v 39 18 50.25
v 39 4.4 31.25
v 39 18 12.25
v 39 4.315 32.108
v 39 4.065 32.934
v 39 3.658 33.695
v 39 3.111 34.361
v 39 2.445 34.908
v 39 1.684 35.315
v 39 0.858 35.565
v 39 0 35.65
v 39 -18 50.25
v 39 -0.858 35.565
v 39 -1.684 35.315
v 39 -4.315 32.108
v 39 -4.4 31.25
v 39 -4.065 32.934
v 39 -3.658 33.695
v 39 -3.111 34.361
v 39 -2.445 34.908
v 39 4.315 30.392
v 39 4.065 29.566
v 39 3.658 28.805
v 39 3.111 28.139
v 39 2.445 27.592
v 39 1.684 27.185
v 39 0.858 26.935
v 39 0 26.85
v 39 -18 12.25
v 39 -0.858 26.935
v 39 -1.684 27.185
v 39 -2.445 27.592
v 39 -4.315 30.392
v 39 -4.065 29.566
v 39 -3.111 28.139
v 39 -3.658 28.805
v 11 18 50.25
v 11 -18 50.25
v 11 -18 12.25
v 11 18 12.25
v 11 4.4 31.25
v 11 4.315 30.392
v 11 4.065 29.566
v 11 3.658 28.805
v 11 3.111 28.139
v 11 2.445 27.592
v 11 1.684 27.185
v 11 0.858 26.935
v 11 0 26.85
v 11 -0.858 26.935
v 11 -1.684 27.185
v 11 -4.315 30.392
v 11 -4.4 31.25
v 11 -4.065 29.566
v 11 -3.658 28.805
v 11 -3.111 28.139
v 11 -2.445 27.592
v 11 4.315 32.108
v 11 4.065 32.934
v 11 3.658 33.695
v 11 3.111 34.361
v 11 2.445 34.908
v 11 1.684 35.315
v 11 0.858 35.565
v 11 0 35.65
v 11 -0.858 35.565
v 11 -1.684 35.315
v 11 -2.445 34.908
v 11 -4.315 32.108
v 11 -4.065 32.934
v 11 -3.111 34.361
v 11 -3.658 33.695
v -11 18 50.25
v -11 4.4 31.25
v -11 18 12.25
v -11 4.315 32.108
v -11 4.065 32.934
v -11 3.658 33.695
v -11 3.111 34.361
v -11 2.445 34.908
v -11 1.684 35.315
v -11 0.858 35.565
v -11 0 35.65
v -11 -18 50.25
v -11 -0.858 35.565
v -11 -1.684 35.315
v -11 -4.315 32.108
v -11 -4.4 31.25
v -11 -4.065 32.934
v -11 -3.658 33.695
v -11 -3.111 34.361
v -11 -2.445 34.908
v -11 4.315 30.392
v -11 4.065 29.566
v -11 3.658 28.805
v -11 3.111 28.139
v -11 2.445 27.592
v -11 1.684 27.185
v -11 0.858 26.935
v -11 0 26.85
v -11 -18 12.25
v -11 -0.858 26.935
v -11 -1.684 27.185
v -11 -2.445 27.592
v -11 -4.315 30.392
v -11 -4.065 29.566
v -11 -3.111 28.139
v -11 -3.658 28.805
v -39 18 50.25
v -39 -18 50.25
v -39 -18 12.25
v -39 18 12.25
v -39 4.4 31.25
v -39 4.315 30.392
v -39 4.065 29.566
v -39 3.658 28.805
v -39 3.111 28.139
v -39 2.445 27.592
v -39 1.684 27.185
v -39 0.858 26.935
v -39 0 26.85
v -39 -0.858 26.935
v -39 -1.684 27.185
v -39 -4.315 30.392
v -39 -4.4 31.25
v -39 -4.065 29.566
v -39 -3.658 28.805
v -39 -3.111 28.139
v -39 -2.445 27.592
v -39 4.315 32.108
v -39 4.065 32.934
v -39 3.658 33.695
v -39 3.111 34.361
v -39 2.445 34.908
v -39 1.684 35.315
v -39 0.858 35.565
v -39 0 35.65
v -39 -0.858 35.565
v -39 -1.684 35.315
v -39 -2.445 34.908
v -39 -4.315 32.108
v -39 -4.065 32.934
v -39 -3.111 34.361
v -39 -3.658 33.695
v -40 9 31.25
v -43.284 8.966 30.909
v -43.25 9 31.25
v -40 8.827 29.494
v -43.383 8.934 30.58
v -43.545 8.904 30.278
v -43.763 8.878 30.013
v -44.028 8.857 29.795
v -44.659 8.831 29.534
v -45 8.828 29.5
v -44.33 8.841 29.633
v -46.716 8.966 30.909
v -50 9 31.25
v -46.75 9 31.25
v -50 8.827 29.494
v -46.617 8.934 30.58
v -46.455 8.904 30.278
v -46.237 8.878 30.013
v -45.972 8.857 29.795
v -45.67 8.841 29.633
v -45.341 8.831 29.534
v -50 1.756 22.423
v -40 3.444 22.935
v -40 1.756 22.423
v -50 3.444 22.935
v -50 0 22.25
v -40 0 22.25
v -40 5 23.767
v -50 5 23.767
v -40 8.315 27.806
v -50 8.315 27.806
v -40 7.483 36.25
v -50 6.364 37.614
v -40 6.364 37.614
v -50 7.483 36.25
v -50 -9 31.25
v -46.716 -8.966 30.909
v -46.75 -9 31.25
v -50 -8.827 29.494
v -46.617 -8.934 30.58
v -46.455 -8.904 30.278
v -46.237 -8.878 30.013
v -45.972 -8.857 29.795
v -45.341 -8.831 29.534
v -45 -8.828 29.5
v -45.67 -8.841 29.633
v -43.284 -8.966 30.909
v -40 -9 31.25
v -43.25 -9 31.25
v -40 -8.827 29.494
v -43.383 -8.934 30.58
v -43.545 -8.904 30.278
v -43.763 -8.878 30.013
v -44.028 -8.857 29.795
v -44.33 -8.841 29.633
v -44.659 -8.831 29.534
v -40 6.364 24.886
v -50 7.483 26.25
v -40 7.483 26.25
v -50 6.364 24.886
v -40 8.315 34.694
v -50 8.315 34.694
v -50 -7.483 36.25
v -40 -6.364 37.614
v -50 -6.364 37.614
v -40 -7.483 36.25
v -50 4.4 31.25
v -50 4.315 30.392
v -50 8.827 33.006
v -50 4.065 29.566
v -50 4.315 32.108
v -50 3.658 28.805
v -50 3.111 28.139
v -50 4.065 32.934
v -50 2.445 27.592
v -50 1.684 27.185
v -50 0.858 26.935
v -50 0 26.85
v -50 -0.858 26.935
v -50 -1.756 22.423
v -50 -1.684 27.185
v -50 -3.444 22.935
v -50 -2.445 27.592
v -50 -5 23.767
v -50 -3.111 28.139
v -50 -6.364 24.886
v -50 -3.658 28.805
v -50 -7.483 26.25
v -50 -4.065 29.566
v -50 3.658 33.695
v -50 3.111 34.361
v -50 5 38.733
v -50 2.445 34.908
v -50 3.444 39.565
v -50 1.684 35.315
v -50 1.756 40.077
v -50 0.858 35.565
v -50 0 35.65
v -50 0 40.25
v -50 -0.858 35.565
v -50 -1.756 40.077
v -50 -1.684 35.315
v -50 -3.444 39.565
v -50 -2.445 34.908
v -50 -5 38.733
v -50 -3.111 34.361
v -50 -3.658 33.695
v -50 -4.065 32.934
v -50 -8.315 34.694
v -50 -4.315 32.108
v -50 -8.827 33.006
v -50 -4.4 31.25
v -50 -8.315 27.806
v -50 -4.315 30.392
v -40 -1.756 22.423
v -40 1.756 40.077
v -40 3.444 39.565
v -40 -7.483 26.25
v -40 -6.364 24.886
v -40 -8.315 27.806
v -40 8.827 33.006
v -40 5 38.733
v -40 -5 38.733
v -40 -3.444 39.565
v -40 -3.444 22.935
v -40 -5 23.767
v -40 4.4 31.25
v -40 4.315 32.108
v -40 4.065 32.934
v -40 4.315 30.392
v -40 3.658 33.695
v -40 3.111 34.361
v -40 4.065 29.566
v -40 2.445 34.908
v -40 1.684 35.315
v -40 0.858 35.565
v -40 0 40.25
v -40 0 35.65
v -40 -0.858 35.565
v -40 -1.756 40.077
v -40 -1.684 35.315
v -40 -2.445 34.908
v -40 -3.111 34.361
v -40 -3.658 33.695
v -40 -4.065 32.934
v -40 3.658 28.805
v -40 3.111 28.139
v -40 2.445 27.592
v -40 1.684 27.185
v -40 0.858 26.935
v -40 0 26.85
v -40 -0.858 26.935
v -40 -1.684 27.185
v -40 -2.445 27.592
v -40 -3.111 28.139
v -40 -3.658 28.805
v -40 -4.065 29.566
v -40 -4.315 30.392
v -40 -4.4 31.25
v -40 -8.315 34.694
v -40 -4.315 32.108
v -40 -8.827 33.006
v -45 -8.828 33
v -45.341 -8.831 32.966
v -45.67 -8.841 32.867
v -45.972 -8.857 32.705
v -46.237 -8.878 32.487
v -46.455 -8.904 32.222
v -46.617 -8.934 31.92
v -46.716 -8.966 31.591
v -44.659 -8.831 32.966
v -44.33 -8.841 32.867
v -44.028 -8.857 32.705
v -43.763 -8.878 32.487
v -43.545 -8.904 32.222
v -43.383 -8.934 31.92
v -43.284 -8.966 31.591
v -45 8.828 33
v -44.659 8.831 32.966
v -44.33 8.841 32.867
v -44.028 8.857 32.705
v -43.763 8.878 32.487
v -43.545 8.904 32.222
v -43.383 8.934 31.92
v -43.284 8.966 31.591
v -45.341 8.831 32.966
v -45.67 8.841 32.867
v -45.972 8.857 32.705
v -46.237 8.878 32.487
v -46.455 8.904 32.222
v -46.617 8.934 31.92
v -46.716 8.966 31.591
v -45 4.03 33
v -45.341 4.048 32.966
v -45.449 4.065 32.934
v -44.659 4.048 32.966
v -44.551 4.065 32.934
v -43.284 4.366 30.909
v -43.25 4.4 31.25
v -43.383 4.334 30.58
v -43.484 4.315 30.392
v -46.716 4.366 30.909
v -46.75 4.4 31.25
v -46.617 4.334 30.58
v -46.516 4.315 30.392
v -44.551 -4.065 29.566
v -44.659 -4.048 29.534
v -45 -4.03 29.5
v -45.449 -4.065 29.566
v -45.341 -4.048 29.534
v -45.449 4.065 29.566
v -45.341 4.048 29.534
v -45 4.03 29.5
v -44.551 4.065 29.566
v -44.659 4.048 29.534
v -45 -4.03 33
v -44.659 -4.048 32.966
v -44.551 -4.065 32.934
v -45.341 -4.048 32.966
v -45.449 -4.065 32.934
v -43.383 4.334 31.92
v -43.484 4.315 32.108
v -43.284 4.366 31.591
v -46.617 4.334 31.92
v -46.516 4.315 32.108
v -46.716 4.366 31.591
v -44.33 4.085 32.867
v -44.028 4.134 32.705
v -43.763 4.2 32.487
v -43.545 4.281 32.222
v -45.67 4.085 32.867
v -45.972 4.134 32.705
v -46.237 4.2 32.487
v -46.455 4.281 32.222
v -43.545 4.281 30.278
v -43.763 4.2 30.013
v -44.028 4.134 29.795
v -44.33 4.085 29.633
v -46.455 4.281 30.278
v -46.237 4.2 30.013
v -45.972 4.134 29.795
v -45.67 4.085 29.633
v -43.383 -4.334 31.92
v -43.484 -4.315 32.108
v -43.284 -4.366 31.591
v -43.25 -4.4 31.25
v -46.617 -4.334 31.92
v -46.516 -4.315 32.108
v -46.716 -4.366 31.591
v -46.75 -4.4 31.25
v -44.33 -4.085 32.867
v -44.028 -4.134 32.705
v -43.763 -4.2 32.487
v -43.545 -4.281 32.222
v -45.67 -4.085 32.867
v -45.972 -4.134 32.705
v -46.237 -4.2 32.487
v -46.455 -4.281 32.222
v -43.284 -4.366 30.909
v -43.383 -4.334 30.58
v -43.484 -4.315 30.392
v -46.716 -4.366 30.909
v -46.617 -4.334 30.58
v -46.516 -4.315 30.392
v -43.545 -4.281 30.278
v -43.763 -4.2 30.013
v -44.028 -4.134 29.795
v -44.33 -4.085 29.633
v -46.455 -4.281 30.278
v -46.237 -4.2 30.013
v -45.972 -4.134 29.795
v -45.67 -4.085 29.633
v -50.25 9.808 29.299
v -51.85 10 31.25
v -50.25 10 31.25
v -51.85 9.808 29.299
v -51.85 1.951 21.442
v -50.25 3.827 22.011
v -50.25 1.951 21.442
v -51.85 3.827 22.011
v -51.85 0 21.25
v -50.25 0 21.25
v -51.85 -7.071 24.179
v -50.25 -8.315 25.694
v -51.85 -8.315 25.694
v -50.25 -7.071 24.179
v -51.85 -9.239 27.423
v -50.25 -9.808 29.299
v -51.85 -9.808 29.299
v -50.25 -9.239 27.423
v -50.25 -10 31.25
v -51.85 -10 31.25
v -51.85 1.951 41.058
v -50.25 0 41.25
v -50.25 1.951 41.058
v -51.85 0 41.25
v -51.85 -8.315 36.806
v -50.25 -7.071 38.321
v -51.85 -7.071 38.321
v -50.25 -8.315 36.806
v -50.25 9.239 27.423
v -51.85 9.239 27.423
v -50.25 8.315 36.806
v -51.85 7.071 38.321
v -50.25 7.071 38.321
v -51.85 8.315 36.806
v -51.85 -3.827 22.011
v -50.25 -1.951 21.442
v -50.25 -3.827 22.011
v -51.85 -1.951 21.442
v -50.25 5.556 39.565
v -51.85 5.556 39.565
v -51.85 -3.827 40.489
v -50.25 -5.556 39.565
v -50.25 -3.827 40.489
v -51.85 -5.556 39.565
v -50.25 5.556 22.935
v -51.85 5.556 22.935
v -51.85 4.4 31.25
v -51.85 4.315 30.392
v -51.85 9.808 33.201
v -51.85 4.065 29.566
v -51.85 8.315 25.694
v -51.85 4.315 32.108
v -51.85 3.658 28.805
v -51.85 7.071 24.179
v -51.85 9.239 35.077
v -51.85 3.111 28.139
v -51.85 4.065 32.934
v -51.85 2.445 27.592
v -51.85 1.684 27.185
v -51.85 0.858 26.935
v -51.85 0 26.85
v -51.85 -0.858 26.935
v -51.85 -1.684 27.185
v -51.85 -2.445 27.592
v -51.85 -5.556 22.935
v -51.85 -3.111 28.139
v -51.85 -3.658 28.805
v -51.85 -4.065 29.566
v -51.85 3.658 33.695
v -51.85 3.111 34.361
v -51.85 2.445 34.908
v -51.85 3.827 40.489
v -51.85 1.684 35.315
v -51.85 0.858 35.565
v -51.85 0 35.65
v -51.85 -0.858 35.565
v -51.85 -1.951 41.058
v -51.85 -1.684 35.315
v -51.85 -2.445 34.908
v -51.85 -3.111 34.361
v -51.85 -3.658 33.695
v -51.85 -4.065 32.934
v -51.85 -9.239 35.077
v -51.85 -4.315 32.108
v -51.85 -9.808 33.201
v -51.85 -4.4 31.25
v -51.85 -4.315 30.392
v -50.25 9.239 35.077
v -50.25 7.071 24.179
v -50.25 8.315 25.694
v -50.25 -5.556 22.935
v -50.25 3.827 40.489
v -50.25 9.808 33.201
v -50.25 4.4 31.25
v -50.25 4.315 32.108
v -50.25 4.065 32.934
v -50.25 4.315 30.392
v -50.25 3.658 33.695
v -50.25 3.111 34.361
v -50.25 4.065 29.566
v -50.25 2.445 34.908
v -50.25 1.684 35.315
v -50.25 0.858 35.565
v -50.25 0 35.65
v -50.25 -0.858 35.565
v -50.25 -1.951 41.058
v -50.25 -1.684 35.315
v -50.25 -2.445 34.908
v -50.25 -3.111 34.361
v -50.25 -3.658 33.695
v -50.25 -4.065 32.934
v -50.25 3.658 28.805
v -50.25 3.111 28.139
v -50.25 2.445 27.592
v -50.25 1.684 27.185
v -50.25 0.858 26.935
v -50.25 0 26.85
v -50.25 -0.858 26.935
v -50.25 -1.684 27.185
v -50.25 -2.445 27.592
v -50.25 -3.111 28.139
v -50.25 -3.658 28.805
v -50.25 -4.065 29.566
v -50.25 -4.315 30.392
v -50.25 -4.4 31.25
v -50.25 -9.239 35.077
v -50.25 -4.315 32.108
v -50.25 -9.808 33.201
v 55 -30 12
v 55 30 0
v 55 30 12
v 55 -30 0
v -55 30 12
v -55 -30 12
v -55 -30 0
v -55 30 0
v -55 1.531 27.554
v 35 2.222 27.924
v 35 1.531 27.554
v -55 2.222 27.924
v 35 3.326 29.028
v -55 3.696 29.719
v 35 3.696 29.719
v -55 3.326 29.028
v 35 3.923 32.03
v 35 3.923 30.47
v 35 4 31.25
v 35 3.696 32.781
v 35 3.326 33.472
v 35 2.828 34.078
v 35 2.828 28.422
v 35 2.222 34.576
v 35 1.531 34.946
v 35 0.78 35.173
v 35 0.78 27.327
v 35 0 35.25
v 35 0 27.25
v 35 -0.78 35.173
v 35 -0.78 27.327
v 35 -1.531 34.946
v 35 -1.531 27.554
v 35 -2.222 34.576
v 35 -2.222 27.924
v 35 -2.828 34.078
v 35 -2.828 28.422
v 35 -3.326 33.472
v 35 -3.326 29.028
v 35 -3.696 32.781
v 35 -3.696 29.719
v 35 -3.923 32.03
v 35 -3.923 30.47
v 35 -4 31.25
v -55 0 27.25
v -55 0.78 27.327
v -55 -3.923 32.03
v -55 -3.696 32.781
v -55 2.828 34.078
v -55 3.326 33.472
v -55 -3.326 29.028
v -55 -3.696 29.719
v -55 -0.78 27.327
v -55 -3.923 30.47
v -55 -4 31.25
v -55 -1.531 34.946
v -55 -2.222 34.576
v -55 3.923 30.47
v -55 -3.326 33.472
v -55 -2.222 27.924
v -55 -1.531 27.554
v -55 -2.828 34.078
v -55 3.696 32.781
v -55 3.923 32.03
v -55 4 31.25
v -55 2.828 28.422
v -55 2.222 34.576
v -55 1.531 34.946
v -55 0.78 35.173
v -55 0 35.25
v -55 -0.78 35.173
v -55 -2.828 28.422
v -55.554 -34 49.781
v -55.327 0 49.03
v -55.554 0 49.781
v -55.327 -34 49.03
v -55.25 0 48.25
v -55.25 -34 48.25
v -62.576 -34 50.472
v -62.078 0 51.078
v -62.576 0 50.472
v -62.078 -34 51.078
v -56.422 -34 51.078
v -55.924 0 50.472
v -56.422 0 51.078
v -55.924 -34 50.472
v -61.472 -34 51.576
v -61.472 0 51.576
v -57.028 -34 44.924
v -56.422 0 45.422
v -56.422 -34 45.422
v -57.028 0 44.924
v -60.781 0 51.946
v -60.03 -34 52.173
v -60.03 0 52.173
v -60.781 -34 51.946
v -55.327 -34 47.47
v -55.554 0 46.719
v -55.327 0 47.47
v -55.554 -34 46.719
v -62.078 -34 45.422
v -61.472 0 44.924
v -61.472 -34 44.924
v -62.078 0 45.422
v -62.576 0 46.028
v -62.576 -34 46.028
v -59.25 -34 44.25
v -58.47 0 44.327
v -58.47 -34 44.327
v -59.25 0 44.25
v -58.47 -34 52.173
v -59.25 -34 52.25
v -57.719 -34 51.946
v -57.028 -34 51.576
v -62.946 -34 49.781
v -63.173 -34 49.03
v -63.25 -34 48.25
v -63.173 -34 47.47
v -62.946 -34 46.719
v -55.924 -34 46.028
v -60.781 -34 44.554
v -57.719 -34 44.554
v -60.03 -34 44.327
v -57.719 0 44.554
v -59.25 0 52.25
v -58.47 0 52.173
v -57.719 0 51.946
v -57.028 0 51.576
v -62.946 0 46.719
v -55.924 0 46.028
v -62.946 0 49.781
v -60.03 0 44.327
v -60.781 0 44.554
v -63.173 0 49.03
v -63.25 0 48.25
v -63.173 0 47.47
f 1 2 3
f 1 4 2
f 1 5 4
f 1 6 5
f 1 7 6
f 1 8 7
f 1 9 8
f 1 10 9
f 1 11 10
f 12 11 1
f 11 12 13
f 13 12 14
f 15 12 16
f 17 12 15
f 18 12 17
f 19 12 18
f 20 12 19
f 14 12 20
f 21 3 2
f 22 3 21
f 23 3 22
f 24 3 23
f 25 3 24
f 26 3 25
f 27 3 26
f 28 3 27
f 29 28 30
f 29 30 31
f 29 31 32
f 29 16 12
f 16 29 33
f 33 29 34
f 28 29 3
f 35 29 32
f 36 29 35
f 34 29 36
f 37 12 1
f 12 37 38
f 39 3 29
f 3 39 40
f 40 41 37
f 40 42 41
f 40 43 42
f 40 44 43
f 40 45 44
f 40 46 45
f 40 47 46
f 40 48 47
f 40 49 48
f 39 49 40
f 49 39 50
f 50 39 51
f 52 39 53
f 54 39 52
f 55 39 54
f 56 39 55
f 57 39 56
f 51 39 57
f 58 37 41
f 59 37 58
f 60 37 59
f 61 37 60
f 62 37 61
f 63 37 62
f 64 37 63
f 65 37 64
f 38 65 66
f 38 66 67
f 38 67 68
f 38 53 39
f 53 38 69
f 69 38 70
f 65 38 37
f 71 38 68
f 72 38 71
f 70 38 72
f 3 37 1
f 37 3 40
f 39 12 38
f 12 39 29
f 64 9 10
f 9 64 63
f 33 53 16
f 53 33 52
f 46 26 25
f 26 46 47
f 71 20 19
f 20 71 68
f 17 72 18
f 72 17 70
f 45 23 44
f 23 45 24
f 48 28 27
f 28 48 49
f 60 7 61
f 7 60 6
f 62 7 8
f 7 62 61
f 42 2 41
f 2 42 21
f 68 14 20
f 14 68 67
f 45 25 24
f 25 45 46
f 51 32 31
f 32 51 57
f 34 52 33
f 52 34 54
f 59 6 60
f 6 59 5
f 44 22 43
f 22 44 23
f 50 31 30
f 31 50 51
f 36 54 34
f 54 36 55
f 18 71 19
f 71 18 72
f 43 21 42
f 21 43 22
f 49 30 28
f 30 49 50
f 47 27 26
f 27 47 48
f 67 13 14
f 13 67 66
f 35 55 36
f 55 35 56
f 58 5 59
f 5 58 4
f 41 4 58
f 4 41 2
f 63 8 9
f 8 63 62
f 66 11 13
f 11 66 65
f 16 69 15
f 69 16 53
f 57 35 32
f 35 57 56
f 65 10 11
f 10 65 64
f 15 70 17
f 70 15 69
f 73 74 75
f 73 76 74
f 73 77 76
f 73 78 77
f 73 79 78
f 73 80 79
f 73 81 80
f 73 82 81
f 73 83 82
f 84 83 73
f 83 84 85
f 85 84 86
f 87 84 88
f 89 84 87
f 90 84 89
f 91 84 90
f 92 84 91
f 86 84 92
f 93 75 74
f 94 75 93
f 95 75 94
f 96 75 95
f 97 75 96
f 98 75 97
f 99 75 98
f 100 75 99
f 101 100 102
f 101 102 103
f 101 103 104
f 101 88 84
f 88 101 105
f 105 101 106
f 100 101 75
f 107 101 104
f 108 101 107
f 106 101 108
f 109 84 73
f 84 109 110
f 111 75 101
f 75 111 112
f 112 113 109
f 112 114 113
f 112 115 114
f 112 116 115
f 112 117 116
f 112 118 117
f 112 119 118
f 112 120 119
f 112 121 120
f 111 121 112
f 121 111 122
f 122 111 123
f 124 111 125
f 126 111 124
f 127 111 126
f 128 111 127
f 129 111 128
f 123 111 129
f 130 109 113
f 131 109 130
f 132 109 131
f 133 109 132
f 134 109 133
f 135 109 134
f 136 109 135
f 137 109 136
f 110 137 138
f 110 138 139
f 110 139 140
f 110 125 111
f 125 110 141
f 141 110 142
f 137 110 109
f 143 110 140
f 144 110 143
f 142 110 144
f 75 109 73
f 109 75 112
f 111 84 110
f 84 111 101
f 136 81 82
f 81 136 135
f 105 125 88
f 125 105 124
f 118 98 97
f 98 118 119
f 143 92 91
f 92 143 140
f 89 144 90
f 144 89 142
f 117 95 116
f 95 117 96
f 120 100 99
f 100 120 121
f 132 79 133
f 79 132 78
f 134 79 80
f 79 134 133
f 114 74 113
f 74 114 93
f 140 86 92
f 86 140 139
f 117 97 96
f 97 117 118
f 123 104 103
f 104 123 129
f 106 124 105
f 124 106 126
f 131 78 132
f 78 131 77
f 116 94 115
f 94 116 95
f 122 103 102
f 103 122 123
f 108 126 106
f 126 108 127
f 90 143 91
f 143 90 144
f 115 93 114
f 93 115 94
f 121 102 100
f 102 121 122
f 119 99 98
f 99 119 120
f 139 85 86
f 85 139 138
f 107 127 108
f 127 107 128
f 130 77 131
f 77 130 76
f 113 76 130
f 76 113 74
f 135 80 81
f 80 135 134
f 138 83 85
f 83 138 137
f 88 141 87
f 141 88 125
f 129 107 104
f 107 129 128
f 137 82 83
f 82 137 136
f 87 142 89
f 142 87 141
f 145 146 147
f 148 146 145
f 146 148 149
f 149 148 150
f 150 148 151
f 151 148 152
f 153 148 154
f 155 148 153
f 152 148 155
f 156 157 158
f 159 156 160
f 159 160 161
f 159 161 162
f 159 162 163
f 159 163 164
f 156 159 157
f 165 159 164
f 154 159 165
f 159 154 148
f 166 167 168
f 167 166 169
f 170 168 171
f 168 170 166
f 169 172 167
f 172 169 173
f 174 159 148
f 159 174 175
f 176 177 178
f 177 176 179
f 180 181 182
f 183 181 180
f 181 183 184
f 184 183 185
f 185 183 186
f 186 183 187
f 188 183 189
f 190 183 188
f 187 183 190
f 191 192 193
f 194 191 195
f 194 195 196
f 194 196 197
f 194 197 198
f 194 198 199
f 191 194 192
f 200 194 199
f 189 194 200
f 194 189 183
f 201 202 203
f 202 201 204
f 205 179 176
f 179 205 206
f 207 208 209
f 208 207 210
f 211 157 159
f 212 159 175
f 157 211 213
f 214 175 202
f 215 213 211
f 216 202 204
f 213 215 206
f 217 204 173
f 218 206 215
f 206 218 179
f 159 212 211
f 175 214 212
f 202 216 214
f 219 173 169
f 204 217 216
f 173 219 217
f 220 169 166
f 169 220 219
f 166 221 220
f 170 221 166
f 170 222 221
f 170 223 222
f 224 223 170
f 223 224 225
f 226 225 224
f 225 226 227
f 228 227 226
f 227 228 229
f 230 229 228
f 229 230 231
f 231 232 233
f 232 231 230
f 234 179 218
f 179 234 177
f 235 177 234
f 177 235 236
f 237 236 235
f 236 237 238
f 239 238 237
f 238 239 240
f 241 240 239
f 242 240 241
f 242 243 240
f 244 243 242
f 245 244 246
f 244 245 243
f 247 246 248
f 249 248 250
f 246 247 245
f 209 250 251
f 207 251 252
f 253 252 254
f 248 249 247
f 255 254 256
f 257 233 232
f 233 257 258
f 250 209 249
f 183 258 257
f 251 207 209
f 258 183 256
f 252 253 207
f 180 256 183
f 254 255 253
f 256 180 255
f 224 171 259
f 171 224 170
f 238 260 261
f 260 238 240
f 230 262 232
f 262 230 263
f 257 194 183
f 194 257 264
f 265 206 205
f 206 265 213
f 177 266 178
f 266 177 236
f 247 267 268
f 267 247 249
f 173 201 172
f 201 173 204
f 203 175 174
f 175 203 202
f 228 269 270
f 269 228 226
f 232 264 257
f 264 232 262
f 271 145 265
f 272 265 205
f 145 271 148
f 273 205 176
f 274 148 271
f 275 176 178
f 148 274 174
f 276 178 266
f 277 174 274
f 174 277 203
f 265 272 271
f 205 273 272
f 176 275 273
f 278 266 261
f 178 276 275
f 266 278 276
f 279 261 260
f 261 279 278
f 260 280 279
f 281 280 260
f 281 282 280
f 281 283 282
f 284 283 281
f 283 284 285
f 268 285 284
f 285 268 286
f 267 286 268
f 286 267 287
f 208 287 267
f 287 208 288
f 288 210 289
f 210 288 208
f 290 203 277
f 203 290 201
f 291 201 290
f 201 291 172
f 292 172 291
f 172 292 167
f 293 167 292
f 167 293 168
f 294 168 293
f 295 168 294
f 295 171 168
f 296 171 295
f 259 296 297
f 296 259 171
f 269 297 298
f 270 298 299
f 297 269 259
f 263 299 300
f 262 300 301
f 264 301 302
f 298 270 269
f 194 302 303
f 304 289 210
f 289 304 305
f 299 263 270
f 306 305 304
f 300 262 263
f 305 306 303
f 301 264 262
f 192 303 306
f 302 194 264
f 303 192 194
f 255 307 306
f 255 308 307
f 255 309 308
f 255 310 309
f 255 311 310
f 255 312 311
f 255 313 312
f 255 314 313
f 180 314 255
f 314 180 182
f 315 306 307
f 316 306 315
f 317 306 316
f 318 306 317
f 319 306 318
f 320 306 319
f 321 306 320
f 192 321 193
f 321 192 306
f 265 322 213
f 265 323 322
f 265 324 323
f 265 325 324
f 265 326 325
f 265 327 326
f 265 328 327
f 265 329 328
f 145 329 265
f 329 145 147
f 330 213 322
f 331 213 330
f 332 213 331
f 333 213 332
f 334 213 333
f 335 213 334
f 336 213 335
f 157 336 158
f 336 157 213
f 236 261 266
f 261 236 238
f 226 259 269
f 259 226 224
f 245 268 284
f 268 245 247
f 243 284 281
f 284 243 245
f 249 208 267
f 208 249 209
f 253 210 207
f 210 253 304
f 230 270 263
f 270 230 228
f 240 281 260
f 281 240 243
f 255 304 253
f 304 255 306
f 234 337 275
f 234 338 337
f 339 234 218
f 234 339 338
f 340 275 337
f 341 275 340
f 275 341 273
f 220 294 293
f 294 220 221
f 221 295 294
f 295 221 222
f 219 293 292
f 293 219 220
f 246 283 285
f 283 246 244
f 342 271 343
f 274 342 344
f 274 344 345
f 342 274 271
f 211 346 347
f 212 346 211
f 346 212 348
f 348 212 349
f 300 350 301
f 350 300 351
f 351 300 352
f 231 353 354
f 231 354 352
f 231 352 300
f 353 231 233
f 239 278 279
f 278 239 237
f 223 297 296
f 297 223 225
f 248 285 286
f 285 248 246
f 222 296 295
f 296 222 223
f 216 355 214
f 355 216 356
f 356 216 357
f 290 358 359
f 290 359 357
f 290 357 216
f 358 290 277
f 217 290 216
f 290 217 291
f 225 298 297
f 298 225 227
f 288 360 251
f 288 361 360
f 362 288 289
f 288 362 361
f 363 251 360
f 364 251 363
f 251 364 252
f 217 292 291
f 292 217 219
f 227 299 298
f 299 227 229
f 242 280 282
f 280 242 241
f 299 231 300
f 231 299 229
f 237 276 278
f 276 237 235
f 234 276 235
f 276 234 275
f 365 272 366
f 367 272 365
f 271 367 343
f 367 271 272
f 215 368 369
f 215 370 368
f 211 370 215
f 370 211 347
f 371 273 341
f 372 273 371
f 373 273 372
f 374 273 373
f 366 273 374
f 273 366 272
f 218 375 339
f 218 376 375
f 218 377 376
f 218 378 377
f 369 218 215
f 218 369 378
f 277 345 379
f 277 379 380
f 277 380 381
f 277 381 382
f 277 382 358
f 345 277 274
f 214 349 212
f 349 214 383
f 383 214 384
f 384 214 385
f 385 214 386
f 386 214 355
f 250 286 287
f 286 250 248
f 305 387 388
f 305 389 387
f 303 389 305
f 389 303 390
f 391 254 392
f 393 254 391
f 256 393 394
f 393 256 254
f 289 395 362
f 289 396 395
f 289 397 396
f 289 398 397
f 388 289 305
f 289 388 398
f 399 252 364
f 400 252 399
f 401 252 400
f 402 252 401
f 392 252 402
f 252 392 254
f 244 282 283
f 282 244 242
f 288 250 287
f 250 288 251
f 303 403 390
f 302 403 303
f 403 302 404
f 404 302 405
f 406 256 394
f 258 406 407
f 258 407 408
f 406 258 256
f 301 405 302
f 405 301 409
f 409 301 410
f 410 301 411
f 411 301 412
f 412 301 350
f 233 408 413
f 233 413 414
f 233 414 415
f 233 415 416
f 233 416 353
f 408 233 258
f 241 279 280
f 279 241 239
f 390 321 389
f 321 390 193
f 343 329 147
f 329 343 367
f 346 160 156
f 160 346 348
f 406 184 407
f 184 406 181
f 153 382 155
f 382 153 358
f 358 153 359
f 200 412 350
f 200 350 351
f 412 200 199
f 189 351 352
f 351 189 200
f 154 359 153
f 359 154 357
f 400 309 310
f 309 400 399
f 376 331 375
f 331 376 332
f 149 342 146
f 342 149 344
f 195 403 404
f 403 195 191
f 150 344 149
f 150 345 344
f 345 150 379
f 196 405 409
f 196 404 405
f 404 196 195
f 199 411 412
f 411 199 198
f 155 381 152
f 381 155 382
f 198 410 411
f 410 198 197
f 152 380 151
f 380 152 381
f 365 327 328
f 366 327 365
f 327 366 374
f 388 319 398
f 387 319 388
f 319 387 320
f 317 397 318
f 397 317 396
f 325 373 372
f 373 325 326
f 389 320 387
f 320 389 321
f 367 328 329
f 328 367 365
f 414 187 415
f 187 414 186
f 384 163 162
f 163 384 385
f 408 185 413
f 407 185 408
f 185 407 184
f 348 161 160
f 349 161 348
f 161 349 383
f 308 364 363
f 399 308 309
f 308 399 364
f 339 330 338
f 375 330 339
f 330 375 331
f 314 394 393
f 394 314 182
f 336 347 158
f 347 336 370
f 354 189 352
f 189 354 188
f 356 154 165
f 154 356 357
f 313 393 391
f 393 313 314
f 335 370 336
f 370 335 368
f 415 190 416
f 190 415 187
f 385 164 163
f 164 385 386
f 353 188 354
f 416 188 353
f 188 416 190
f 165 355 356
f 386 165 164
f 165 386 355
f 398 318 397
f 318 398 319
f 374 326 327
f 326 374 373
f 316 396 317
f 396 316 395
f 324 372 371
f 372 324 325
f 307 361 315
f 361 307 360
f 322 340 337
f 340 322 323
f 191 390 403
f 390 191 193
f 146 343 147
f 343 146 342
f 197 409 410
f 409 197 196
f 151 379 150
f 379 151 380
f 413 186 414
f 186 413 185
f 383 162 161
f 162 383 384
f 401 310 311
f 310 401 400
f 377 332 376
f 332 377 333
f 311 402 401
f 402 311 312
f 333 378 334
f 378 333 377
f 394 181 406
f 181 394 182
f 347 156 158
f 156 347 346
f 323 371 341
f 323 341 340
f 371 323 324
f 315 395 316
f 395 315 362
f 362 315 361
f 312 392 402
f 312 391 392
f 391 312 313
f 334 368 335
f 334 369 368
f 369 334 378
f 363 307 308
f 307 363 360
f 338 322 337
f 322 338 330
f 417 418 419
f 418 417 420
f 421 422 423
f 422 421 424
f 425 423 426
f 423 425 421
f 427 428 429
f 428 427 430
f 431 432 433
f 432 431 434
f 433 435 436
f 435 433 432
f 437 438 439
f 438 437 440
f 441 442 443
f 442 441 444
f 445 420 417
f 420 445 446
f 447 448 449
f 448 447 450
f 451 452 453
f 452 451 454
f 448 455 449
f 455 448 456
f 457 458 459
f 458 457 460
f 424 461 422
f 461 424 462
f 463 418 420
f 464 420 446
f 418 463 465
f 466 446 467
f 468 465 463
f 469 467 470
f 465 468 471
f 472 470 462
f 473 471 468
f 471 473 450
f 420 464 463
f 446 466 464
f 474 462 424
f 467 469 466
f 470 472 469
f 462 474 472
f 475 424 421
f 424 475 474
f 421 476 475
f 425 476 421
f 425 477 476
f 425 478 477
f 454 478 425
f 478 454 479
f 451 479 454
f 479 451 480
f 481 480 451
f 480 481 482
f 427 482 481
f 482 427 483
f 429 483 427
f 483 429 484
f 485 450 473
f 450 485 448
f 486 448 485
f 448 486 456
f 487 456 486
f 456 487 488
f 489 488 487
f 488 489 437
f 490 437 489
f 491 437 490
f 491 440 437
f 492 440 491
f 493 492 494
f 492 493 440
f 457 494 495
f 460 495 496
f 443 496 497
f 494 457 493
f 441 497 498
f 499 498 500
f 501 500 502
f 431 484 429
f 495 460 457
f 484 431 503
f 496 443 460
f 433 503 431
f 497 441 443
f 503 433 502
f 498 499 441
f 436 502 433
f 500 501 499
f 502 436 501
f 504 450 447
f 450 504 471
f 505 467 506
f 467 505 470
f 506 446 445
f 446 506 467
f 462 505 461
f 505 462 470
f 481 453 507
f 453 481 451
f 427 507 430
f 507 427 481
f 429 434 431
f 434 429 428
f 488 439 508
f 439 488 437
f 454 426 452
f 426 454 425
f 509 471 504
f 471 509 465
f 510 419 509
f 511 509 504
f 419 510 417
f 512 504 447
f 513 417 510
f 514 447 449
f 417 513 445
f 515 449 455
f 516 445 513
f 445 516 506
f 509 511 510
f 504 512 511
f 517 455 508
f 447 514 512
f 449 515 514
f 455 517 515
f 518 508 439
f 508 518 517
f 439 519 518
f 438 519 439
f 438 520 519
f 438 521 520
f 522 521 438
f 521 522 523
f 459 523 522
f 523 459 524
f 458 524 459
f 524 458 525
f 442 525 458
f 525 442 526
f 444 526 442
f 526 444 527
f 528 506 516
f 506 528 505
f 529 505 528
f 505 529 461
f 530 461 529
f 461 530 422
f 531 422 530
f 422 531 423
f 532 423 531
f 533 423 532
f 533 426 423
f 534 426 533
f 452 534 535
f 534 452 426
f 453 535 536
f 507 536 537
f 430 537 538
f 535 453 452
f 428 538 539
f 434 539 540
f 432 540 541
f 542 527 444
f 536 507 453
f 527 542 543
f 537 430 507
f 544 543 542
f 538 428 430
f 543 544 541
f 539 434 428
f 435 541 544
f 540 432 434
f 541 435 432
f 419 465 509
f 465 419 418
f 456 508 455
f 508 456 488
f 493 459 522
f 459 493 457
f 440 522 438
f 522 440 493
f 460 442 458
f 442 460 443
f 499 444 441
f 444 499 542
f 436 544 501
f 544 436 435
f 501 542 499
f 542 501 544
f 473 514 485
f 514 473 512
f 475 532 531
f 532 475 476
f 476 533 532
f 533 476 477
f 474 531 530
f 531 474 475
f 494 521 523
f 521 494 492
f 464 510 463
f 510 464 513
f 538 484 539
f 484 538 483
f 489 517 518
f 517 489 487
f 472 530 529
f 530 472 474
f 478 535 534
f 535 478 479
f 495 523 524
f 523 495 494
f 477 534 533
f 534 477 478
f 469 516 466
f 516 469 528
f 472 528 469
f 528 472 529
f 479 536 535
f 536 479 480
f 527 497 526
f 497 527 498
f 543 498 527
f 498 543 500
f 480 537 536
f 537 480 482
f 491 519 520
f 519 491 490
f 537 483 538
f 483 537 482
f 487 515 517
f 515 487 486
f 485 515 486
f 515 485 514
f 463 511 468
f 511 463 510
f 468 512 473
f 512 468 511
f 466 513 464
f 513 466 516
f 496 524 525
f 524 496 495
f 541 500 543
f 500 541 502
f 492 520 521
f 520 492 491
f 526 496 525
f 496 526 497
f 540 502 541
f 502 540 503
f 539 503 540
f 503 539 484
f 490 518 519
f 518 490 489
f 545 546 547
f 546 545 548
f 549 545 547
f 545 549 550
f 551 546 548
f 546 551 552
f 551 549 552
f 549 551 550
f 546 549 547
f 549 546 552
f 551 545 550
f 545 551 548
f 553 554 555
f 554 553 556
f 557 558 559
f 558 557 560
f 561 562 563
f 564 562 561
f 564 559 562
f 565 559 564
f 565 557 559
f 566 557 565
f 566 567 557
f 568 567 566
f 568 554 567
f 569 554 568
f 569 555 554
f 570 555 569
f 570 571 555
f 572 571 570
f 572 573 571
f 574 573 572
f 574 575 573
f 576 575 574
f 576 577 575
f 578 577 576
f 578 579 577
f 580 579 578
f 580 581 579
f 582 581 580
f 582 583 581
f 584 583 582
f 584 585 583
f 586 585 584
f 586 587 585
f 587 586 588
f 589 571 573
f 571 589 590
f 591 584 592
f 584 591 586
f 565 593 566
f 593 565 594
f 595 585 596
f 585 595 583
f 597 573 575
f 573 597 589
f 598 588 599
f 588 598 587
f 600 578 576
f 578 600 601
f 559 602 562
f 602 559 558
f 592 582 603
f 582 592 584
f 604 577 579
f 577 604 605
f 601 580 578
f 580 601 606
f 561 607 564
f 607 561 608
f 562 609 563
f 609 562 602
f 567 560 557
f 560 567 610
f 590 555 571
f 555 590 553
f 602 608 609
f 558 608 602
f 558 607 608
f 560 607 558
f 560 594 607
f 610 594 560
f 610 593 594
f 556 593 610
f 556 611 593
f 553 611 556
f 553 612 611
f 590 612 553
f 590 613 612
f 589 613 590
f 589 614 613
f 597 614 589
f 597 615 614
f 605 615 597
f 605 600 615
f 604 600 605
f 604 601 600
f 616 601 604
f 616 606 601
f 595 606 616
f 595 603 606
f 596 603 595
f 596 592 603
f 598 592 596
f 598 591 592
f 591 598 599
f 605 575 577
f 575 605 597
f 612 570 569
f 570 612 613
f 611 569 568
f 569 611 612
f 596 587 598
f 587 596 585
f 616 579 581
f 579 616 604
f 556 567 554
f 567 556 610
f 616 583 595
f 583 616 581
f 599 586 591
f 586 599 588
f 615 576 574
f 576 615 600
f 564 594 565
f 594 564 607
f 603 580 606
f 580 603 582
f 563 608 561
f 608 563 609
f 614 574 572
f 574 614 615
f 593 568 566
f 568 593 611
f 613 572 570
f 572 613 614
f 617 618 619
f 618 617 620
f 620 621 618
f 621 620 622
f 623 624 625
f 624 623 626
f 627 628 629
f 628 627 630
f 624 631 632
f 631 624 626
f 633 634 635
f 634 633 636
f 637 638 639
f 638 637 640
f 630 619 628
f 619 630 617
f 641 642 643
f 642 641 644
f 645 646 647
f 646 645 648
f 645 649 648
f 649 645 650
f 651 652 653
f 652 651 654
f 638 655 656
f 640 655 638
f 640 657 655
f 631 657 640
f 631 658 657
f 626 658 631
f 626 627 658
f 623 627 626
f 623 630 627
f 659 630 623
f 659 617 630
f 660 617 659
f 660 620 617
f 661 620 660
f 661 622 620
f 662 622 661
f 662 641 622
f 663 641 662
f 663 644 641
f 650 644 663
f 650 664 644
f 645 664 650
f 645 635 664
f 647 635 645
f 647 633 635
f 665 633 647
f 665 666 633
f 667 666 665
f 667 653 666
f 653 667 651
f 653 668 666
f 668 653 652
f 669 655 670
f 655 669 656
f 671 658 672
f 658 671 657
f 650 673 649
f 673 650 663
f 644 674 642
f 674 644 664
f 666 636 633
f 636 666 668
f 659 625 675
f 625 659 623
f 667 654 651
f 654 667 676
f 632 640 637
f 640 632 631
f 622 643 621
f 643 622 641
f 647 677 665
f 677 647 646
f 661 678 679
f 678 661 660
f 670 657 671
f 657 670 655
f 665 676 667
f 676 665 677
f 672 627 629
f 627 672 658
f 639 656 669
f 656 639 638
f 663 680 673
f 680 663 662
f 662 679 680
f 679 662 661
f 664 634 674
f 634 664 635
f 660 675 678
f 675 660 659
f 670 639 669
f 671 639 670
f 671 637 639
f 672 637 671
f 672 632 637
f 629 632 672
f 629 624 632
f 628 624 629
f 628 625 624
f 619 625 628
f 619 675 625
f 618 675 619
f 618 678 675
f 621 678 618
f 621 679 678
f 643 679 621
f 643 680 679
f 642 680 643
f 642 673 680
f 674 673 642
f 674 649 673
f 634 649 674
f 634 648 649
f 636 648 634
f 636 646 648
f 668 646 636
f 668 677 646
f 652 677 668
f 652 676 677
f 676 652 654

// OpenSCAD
$fn = 32;

// ------------------------------------------------------------------------
// Machine vise: screw d8, jaws 28 x 38 mm
// Every part is its own module, assembly() places every instance.
// ------------------------------------------------------------------------

// --- part 1 ---
module vise_bed() {
  difference() {
    translate([-55, -30, 0]) cube([110, 60, 12]);
  }
}

// --- part 2 ---
module vise_jaw() {
  difference() {
    translate([-14, -18, 0]) cube([28, 36, 38]);
    translate([0, 0, 19]) rotate([0, 90, 0]) cylinder(h = 30, d = 8.8, center = true);
  }
}

// --- part 3 ---
module vise_screw() {
  translate([0, 0, -45]) cylinder(h = 90, d = 8);
}

// --- part 4 ---
module screw_collar() {
  difference() {
    cylinder(h = 10, d = 18);
    translate([0, 0, -1]) cylinder(h = 12, d = 8.8);
    translate([0, 0, 5]) rotate([90, 0, 0]) cylinder(h = 20, d = 3.5, center = true);
  }
}

// --- part 5 ---
module screw_washer() {
  difference() {
      translate([0, 0, 0]) cylinder(h = 1.6, d = 20);
      translate([0, 0, -1]) cylinder(h = 3.6, d = 8.8);
    }
}

// --- part 6 ---
module vise_handle() {
  cylinder(h = 34, d = 8);
}

// --- assembly ---
module assembly() {
  color([0.80, 0.24, 0.20]) translate([0, 0, 0]) rotate([0, 0, 0]) vise_bed();
  color([0.20, 0.45, 0.75]) translate([25, 0, 12.25]) rotate([0, 0, 0]) vise_jaw();
  color([0.25, 0.62, 0.32]) translate([-25, 0, 12.25]) rotate([0, 0, 0]) vise_jaw();
  color([0.92, 0.70, 0.18]) translate([-10, 0, 31.25]) rotate([0, 90, 0]) vise_screw();
  color([0.58, 0.35, 0.70]) translate([-50, 0, 31.25]) rotate([0, 90, 0]) screw_collar();
  color([0.16, 0.66, 0.66]) translate([-51.85, 0, 31.25]) rotate([0, 90, 0]) screw_washer();
  color([0.85, 0.48, 0.18]) translate([-59.25, 0, 48.25]) rotate([90, 0, 0]) vise_handle();
}

assembly();
